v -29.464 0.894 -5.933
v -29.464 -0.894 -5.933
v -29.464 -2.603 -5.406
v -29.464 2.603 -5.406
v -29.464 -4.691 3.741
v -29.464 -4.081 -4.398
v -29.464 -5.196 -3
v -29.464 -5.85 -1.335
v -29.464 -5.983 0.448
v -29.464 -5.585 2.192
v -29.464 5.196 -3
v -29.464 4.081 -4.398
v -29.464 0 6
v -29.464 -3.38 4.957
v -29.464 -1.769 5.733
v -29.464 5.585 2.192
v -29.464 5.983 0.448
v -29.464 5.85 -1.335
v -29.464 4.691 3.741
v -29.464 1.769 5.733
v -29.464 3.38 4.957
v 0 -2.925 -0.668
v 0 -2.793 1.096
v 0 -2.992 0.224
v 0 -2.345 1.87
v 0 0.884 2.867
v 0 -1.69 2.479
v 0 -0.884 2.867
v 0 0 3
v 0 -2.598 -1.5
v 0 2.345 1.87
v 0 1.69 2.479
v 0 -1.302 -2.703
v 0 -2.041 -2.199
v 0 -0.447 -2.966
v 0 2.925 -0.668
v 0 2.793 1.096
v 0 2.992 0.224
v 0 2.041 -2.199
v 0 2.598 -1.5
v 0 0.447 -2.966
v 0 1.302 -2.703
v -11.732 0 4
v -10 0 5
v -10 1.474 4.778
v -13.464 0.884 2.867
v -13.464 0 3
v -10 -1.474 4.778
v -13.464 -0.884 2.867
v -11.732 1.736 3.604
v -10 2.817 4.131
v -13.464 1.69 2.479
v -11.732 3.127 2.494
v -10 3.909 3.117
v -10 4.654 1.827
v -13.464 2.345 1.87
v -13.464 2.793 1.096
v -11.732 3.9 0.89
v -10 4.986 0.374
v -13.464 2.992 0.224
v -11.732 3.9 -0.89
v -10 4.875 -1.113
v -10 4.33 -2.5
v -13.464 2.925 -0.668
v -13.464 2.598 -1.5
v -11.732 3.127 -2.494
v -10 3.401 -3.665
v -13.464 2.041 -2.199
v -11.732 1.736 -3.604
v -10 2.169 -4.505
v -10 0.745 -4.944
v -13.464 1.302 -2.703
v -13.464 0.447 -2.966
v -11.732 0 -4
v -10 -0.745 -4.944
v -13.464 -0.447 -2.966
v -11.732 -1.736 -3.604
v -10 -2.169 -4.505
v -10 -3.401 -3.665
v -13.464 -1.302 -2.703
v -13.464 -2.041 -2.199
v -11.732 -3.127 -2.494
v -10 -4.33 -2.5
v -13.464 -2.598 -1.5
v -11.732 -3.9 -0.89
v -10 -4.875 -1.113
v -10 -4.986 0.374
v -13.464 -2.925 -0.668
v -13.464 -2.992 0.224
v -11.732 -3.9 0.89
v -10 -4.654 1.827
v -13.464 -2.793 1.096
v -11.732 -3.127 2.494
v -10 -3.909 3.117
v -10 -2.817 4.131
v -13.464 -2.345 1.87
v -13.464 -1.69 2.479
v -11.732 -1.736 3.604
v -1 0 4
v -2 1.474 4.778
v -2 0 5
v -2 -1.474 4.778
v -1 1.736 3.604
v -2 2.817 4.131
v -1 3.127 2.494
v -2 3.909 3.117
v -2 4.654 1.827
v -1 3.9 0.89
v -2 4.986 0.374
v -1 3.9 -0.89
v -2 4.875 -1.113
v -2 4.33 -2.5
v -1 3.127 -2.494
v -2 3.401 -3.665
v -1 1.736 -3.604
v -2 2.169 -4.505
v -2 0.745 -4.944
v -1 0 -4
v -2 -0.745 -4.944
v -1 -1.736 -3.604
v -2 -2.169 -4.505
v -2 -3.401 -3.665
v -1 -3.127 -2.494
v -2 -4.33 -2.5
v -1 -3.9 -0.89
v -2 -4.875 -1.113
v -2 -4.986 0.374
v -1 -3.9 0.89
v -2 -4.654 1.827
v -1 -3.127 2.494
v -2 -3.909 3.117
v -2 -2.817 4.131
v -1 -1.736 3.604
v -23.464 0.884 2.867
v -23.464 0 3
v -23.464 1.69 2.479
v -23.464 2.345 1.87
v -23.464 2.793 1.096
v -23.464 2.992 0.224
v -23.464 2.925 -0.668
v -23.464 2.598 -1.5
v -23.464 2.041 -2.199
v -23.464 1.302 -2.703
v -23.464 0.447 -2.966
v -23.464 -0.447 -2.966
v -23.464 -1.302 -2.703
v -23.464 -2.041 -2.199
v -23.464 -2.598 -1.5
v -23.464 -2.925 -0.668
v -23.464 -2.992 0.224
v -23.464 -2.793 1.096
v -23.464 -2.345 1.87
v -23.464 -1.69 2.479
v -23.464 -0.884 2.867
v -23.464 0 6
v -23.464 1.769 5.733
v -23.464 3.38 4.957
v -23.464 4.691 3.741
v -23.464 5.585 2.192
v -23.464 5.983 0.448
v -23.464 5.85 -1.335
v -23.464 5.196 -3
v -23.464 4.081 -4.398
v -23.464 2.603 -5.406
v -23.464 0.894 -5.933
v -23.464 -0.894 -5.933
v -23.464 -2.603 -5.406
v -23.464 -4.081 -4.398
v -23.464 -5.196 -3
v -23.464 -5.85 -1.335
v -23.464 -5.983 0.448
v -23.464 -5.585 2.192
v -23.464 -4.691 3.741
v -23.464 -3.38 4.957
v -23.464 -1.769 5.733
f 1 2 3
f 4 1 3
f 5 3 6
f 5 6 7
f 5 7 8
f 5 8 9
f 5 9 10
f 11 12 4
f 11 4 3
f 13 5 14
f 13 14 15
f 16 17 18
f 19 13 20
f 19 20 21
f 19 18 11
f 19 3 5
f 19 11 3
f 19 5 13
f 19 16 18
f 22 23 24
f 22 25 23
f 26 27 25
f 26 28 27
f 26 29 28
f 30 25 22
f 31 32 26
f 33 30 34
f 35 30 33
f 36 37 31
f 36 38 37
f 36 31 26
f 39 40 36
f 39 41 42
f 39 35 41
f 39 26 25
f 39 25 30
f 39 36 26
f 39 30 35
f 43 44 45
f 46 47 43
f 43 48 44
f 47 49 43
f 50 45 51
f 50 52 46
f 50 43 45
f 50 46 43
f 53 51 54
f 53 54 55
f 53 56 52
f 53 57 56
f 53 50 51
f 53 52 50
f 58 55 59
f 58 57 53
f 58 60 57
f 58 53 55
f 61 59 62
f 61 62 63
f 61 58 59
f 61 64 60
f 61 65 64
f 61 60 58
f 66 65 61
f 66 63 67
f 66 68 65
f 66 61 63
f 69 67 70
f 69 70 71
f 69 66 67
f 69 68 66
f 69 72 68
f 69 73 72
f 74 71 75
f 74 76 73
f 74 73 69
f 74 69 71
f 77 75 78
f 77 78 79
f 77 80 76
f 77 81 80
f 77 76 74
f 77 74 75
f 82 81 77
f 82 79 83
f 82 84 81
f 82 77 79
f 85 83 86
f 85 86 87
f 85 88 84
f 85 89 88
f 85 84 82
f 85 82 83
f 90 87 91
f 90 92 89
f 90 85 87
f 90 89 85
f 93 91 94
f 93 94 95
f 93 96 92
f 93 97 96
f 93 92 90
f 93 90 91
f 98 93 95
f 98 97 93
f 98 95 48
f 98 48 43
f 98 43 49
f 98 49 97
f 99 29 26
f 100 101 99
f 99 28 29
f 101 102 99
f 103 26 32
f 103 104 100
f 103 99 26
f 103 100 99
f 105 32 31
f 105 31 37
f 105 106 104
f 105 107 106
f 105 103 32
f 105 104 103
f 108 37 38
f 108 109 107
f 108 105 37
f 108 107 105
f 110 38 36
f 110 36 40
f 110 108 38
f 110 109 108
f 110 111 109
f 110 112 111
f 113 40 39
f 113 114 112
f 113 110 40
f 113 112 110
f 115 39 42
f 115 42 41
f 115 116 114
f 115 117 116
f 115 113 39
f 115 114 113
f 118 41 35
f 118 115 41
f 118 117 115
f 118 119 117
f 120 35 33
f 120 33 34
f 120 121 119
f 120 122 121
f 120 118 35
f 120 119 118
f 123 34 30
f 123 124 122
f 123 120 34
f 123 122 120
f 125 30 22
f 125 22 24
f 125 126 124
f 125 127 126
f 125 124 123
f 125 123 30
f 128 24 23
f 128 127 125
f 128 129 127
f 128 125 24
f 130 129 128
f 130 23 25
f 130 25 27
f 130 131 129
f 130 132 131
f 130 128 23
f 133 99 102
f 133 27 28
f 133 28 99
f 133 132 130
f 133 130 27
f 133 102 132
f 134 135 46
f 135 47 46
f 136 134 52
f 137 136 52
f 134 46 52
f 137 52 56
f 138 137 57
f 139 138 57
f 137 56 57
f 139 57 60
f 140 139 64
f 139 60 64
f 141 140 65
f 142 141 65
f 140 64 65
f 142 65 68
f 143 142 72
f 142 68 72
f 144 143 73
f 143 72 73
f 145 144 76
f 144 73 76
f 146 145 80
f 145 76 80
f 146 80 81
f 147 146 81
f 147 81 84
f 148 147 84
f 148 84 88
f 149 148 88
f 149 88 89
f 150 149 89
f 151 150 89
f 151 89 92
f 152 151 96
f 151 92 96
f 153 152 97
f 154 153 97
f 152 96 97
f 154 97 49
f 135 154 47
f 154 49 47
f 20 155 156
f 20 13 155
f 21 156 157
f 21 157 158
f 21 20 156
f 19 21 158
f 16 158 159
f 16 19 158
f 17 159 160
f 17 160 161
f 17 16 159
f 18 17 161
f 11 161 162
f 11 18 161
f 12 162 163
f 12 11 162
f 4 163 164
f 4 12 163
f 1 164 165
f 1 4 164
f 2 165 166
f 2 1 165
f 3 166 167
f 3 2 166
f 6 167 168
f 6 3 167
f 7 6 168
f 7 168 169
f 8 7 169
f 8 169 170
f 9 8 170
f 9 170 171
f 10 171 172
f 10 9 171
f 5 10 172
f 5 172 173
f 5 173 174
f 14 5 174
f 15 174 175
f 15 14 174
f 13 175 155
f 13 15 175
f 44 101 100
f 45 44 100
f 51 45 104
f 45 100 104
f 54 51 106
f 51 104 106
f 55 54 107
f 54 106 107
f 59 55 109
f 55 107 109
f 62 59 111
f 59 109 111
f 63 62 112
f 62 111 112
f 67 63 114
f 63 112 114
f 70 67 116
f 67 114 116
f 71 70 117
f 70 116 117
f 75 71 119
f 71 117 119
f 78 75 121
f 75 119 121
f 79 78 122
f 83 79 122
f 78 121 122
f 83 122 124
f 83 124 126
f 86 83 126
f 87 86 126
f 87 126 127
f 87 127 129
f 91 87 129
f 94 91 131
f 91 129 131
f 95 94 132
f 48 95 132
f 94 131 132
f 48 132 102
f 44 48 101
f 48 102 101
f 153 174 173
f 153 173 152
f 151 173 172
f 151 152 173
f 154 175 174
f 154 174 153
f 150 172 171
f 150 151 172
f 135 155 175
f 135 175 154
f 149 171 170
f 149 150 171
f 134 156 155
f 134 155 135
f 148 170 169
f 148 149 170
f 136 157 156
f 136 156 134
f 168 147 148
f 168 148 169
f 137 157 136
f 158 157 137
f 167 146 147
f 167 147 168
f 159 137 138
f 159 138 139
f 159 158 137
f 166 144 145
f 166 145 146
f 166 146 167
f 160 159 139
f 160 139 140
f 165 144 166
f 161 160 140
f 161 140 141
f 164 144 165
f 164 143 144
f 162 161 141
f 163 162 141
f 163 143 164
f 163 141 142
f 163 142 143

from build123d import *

# Parameters (mm, degrees)
F0_W    = 10
F0_H    = 5
F0_H_2  = 3
F2_SIZE = 2


with BuildPart() as f1:
    # F0 (on Front) → F1 (revolve)
    with BuildSketch(Plane.XZ):
        with Locations((-5, 2.5)):
            Rectangle(F0_W, F0_H)
        Polygon((-10, 0), (-10, 5), (-13.464102, 3), (-13.464102, 0), align=None)
        with Locations((-18.464102, 1.5)):
            Rectangle(F0_W, F0_H_2)
        Polygon((-23.464102, 0), (-23.464102, 3), (-23.464102, 6), (-29.464102, 6), (-29.464102, 0), align=None)
    revolve(axis=Axis((-14.839673, 0, 0), (-1, 0, 0)))

    # F2
    f2_edges = [f1.edges().sort_by_distance(p)[0] for p in [
        (0, 0, -5),
    ]]
    chamfer(f2_edges, length=F2_SIZE)


solid = f1.part
